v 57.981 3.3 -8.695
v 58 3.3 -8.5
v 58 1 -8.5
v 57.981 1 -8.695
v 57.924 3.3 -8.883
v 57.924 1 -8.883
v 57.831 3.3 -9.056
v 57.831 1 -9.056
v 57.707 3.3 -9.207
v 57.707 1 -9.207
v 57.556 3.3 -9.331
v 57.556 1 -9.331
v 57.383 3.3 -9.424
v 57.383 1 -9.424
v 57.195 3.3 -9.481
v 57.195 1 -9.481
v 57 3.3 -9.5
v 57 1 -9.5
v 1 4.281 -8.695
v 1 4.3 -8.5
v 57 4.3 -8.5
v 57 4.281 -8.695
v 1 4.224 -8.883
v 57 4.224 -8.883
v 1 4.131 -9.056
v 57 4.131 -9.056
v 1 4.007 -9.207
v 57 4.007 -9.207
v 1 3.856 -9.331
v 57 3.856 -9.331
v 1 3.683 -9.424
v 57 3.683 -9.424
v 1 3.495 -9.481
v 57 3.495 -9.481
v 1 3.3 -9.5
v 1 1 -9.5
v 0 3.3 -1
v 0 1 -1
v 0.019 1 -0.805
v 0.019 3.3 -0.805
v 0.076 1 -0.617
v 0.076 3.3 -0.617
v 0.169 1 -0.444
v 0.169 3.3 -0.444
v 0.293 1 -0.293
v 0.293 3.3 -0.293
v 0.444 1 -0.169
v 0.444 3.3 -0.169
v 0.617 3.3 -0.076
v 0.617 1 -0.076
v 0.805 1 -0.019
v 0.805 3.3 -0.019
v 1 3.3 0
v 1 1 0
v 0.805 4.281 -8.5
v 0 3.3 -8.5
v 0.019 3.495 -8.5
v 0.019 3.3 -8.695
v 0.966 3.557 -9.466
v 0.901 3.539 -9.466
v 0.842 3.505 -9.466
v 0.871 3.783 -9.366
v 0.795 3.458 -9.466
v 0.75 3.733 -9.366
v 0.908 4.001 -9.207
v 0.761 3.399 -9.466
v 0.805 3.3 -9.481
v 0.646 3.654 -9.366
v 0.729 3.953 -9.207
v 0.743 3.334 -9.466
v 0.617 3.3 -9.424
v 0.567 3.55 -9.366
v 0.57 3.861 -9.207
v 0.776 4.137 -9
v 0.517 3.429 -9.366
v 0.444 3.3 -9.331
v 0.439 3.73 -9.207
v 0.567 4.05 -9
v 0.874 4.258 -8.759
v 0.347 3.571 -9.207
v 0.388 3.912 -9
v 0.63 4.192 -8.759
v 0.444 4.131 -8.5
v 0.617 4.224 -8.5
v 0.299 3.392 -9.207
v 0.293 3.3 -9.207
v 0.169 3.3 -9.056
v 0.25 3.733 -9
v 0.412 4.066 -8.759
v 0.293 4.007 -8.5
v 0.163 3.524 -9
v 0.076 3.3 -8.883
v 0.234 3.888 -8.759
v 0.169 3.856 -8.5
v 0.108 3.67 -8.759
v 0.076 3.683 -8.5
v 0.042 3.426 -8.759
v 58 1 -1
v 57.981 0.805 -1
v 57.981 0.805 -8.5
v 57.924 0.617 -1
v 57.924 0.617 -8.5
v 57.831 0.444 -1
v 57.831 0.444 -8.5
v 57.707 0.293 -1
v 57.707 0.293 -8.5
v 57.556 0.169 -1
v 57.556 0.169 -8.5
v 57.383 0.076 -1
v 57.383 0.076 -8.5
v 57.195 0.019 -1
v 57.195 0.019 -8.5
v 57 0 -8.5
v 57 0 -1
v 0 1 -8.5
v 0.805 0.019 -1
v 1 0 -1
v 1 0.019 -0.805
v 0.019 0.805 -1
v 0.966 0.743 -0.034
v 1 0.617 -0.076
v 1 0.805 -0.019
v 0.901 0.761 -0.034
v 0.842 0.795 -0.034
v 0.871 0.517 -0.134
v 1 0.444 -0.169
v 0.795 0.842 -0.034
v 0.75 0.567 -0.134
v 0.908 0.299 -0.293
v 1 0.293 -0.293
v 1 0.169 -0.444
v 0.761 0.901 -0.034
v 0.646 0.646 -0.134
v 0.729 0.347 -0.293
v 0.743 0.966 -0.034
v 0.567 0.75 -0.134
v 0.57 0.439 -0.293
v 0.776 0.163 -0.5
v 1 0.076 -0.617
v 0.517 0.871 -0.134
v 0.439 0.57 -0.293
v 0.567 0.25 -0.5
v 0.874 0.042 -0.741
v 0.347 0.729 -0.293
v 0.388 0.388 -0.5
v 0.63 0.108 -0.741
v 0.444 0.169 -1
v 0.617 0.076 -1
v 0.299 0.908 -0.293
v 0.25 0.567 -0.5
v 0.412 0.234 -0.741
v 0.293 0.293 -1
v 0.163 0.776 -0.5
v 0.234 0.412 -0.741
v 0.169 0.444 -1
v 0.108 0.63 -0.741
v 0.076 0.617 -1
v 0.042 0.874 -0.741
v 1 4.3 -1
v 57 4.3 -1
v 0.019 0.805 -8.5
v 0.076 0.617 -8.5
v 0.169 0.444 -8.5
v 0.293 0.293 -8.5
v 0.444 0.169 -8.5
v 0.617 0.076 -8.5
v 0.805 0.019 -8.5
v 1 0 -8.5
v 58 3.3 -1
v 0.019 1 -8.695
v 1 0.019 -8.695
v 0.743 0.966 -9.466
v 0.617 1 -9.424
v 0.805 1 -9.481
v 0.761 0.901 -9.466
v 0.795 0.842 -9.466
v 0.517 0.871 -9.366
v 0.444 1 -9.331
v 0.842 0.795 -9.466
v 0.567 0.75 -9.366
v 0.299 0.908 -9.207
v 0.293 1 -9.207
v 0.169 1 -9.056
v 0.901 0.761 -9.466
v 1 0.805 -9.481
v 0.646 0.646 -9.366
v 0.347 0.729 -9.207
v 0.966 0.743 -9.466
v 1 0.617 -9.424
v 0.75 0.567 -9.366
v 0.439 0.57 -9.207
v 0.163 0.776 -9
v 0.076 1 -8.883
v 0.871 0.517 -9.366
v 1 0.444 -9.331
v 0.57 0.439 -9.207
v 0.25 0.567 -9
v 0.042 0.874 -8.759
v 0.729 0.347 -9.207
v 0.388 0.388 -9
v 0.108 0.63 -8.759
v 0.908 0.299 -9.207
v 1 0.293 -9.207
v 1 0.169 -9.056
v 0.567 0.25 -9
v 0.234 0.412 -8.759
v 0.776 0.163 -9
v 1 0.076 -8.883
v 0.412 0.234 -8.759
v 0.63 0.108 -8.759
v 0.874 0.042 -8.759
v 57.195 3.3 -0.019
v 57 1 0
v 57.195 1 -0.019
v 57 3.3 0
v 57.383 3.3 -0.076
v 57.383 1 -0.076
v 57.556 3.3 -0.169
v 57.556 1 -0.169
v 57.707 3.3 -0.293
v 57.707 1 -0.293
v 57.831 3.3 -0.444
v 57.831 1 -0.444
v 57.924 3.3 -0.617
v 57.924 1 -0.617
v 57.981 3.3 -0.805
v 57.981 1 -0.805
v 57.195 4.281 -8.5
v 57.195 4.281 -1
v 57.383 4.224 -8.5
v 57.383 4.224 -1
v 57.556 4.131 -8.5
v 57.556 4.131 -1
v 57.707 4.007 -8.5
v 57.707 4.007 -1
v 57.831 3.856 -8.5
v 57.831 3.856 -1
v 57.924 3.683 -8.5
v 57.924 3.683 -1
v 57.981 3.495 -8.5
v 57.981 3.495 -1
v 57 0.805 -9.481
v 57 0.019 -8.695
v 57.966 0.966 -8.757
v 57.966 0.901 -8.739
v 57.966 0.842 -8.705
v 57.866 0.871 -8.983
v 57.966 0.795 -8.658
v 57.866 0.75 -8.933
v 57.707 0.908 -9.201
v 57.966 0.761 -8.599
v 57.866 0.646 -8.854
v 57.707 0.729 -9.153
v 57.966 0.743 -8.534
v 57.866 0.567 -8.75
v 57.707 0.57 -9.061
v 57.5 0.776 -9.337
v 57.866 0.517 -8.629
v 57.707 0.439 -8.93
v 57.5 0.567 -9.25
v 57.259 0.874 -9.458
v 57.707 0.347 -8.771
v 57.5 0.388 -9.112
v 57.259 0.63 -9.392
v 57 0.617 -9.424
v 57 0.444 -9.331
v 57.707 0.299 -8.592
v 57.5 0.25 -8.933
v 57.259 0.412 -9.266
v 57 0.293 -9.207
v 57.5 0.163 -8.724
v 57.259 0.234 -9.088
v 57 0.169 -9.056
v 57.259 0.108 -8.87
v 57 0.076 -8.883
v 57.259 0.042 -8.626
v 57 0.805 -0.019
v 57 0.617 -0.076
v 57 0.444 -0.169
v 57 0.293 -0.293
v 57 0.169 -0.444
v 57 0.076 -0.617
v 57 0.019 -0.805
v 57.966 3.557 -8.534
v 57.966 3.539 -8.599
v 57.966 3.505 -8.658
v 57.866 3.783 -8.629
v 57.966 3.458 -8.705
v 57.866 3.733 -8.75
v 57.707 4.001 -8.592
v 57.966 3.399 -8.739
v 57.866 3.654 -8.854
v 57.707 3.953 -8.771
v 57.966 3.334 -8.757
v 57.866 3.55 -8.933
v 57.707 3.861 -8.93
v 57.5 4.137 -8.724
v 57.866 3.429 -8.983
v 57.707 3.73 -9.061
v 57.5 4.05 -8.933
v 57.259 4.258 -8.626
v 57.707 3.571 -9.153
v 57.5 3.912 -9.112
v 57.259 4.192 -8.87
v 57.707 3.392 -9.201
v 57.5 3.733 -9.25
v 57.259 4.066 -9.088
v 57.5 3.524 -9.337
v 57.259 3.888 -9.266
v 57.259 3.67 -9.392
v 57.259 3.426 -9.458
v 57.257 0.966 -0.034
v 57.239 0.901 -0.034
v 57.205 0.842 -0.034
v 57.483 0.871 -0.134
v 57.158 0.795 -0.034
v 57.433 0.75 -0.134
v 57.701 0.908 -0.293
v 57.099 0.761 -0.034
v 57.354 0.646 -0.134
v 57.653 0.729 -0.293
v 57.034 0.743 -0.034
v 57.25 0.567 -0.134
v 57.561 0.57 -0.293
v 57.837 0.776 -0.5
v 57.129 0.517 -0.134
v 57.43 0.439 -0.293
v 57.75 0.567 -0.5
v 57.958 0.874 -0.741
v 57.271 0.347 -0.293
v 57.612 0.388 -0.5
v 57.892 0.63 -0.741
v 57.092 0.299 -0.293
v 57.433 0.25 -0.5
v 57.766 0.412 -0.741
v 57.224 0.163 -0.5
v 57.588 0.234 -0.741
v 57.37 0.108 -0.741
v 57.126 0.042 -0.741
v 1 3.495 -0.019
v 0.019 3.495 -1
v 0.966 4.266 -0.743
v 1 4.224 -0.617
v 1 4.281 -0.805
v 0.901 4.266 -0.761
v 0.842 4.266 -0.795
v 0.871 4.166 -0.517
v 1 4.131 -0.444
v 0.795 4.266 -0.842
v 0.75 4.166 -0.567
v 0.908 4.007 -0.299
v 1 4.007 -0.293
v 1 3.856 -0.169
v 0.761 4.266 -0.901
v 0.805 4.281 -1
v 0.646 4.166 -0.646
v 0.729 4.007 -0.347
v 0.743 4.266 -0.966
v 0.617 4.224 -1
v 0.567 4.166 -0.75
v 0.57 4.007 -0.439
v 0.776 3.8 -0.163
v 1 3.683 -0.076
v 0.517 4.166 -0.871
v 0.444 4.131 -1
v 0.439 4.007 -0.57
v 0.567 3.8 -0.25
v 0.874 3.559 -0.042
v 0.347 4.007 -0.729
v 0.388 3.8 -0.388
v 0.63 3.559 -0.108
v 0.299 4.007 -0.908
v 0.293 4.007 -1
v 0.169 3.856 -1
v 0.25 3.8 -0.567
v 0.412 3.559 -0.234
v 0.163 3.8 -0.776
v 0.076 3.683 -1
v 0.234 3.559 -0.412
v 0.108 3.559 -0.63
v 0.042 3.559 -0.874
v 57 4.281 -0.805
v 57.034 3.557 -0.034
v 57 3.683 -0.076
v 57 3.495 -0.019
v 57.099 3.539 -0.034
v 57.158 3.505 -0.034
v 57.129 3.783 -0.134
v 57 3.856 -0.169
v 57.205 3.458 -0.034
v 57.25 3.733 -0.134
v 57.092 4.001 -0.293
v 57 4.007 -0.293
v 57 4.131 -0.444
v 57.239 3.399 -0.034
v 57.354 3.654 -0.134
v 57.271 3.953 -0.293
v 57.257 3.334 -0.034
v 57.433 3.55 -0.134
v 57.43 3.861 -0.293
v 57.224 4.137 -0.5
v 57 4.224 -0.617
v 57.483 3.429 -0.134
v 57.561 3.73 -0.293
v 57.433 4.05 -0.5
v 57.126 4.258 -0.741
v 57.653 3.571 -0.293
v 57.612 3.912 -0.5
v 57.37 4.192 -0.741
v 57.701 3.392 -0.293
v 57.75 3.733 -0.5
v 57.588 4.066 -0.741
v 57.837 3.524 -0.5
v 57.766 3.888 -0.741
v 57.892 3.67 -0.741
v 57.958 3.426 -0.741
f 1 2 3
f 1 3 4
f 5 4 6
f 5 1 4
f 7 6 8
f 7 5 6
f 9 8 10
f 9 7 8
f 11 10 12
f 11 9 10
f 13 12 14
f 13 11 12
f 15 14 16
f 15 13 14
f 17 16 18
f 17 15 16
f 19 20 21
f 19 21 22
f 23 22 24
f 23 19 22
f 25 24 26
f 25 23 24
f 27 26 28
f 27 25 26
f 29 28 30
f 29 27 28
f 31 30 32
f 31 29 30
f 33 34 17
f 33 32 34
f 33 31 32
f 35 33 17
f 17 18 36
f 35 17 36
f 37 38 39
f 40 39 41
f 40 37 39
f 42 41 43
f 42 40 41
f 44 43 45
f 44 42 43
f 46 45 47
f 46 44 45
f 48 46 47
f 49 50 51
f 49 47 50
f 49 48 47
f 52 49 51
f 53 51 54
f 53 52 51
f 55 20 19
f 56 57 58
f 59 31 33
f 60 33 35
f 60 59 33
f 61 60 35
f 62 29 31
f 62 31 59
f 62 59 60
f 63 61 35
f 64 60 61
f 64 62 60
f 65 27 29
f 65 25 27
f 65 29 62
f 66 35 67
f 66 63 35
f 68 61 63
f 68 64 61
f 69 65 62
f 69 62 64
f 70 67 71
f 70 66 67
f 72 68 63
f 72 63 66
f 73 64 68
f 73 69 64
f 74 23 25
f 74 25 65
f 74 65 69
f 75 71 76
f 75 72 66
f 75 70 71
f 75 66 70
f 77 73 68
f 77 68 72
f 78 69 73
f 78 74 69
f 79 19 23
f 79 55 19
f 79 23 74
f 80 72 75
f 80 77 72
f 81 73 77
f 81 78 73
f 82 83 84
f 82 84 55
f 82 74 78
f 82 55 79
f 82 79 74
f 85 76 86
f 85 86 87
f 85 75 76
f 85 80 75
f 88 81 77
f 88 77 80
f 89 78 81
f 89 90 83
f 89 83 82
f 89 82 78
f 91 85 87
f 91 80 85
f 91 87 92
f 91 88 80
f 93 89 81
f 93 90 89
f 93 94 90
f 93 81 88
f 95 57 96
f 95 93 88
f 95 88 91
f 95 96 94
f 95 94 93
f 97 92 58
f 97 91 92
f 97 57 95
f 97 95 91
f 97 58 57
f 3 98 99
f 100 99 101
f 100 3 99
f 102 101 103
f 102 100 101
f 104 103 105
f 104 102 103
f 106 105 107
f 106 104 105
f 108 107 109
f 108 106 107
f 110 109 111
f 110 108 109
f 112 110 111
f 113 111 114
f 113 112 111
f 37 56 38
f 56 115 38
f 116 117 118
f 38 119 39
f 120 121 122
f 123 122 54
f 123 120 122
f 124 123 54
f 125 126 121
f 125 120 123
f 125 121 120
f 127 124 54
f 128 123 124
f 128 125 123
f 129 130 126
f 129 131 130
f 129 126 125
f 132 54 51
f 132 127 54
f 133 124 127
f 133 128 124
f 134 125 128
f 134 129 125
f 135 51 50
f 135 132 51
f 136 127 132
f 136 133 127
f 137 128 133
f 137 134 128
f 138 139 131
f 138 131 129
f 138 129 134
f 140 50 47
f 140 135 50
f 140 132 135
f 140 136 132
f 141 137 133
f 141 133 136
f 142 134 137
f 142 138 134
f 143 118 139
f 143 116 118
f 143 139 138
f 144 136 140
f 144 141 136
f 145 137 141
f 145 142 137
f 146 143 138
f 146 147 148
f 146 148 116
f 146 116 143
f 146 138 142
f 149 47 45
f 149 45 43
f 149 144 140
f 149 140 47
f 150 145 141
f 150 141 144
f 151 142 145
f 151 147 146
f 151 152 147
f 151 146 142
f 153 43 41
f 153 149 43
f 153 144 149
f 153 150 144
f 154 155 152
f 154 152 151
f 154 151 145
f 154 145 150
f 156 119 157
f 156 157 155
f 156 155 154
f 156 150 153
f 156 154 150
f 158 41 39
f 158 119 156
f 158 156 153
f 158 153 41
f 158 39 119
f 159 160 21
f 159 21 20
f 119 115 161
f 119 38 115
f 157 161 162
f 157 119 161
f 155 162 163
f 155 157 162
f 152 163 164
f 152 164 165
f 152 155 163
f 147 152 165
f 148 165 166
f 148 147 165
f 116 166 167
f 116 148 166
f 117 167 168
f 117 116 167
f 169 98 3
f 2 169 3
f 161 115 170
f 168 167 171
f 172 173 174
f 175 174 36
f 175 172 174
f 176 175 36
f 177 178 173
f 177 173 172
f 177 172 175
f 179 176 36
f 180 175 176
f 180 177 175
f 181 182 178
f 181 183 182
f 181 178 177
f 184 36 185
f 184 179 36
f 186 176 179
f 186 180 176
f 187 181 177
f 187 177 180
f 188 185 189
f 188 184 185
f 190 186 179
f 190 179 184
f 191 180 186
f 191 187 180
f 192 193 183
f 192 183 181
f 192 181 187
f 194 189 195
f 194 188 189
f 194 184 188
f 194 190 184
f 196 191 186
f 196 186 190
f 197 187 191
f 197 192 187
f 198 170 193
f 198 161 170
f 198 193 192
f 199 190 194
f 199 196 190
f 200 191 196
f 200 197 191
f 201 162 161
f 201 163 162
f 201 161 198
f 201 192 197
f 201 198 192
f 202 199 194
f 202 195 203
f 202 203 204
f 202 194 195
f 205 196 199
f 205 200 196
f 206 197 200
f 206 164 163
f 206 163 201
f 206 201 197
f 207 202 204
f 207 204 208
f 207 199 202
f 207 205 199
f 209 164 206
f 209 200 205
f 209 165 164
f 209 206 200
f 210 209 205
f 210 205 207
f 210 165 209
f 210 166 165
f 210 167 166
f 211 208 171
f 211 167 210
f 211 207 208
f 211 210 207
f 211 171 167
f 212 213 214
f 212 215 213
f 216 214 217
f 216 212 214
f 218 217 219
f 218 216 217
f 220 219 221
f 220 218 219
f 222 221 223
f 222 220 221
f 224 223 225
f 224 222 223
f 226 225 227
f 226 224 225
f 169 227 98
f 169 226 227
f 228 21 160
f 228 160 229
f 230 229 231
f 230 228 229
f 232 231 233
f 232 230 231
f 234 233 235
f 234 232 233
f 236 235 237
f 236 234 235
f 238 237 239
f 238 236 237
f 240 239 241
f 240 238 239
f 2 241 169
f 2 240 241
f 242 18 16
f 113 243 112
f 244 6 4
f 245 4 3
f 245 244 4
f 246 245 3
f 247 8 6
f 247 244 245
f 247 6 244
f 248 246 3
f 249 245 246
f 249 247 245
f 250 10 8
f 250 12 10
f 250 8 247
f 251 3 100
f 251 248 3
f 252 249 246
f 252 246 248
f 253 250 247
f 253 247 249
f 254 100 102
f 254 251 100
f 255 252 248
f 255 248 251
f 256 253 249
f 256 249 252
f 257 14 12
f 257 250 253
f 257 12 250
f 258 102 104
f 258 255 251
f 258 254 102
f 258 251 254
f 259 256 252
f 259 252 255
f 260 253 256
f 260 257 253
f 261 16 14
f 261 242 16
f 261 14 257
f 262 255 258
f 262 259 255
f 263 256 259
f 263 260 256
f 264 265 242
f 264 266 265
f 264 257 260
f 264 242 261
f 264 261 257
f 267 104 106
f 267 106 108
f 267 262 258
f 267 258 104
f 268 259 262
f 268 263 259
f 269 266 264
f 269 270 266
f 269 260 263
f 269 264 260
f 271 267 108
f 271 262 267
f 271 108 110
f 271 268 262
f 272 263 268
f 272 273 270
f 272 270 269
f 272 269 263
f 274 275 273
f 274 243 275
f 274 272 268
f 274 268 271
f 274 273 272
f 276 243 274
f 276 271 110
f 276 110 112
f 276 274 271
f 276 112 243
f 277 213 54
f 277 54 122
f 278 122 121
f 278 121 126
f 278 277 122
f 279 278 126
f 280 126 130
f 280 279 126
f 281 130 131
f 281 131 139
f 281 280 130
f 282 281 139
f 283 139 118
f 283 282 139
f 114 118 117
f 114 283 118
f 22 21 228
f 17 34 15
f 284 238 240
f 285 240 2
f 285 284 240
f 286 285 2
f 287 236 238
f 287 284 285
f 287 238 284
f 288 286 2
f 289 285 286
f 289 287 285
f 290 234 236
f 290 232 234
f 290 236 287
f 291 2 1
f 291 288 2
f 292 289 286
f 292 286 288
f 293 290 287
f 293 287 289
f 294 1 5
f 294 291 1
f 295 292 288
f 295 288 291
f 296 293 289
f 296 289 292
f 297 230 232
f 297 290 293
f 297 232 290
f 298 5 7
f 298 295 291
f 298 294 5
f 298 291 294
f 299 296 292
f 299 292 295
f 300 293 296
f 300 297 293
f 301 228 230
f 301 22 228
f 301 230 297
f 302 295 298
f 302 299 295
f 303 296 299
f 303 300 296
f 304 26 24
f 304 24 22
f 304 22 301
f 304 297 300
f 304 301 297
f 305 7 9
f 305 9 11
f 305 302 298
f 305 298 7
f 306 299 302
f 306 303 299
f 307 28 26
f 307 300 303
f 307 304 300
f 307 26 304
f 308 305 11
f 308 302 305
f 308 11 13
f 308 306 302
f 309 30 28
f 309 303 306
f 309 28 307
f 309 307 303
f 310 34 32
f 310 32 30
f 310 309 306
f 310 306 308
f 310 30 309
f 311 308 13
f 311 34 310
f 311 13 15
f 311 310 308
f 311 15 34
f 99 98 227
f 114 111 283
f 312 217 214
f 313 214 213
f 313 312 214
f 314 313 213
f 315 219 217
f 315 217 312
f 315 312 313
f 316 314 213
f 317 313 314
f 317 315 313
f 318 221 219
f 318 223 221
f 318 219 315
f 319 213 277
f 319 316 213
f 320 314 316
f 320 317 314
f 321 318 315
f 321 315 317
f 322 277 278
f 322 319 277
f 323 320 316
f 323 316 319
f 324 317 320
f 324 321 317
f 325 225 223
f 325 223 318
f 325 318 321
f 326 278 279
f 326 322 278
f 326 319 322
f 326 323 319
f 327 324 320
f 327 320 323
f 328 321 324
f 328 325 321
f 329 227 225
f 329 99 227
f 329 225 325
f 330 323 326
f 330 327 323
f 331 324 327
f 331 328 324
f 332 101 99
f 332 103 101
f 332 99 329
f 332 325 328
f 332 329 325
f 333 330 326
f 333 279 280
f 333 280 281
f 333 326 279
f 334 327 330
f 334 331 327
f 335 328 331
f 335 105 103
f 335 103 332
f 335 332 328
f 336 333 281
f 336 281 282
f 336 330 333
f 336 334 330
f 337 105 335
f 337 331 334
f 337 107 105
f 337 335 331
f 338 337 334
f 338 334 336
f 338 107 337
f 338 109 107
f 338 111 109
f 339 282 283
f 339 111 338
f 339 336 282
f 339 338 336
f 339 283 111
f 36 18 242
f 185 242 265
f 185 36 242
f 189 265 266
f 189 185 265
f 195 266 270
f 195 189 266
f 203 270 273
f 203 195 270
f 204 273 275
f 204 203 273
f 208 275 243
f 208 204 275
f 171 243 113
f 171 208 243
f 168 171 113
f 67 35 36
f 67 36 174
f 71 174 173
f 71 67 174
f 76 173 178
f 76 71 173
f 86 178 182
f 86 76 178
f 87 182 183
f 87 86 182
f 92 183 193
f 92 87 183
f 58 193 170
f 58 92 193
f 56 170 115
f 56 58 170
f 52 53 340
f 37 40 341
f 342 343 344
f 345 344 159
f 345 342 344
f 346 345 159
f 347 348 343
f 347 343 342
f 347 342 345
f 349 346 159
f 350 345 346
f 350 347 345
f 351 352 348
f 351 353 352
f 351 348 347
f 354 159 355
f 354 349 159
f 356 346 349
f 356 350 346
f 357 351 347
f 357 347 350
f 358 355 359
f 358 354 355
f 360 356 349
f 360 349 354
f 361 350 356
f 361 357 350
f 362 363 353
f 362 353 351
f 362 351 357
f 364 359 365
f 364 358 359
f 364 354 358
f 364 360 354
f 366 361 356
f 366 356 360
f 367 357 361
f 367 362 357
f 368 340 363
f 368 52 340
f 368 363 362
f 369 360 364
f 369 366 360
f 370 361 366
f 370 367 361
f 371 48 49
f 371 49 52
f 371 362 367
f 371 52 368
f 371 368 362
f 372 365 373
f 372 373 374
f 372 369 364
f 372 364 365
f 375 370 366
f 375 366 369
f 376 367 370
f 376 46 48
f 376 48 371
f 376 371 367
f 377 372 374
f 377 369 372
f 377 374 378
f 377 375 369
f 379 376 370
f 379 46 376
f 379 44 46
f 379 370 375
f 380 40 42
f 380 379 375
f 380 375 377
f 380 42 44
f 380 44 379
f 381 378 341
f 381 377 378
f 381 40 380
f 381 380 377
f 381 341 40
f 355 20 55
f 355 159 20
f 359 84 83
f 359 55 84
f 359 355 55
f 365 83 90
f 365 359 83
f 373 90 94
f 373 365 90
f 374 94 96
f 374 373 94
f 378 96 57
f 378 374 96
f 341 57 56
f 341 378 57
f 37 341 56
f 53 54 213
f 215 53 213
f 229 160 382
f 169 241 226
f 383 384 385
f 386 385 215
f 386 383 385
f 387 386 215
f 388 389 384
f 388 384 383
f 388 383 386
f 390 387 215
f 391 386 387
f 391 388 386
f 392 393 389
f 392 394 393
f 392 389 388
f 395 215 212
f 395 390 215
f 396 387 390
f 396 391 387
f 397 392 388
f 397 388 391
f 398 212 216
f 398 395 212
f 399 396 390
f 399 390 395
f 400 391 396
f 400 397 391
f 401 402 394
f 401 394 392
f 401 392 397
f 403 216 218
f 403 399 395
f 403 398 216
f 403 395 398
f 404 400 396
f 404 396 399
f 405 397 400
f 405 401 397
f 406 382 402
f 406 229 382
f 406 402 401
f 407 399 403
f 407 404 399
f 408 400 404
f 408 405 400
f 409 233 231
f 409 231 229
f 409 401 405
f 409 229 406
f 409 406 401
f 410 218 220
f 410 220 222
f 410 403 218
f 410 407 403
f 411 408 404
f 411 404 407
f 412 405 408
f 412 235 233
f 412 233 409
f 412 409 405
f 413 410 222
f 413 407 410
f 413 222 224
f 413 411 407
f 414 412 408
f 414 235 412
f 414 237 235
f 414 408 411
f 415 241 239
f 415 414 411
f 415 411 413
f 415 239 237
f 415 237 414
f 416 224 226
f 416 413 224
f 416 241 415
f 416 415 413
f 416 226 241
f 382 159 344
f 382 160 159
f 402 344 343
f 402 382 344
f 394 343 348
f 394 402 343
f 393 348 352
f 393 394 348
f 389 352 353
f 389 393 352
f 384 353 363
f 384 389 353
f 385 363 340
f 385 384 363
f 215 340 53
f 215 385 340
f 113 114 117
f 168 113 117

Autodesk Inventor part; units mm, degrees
ref_plane "YZ Plane" through (0, 0, 0) normal (1, 0, 0) x (0, 1, 0)
ref_plane "XZ Plane" through (0, 0, 0) normal (0, 1, 0) x (-1, 0, 0)
ref_plane "XY Plane" through (0, 0, 0) normal (0, 0, 1) x (1, 0, 0)
sketch "Sketch1" plane through (0, 0, 0) normal (0, 1, 0) x (-1, 0, 0)
  line L0 (0, 0) -> (-58, 0)
  line L1 (-58, 0) -> (-58, -9.5)
  line L2 (-58, -9.5) -> (0, -9.5)
  line L3 (0, -9.5) -> (0, 0)
  dimension "d0" = 58
  dimension "d1" = 9.5
extrude "Extrusion1" add sketch "Sketch1" along normal blind 4.3
fillet "Fillet1" radius 1 12 edges at (0, 0, -4.75) (0, 2.15, 0) (0, 4.3, -4.75) (0, 2.15, -9.5) (29, 0, -9.5) (29, 4.3, -9.5) (58, 2.15, -9.5) (58, 0, -4.75) (58, 4.3, -4.75) (58, 2.15, 0) (29, 0, 0) (29, 4.3, 0)
properties part number "Magnet6010" material "Stainless Steel"
